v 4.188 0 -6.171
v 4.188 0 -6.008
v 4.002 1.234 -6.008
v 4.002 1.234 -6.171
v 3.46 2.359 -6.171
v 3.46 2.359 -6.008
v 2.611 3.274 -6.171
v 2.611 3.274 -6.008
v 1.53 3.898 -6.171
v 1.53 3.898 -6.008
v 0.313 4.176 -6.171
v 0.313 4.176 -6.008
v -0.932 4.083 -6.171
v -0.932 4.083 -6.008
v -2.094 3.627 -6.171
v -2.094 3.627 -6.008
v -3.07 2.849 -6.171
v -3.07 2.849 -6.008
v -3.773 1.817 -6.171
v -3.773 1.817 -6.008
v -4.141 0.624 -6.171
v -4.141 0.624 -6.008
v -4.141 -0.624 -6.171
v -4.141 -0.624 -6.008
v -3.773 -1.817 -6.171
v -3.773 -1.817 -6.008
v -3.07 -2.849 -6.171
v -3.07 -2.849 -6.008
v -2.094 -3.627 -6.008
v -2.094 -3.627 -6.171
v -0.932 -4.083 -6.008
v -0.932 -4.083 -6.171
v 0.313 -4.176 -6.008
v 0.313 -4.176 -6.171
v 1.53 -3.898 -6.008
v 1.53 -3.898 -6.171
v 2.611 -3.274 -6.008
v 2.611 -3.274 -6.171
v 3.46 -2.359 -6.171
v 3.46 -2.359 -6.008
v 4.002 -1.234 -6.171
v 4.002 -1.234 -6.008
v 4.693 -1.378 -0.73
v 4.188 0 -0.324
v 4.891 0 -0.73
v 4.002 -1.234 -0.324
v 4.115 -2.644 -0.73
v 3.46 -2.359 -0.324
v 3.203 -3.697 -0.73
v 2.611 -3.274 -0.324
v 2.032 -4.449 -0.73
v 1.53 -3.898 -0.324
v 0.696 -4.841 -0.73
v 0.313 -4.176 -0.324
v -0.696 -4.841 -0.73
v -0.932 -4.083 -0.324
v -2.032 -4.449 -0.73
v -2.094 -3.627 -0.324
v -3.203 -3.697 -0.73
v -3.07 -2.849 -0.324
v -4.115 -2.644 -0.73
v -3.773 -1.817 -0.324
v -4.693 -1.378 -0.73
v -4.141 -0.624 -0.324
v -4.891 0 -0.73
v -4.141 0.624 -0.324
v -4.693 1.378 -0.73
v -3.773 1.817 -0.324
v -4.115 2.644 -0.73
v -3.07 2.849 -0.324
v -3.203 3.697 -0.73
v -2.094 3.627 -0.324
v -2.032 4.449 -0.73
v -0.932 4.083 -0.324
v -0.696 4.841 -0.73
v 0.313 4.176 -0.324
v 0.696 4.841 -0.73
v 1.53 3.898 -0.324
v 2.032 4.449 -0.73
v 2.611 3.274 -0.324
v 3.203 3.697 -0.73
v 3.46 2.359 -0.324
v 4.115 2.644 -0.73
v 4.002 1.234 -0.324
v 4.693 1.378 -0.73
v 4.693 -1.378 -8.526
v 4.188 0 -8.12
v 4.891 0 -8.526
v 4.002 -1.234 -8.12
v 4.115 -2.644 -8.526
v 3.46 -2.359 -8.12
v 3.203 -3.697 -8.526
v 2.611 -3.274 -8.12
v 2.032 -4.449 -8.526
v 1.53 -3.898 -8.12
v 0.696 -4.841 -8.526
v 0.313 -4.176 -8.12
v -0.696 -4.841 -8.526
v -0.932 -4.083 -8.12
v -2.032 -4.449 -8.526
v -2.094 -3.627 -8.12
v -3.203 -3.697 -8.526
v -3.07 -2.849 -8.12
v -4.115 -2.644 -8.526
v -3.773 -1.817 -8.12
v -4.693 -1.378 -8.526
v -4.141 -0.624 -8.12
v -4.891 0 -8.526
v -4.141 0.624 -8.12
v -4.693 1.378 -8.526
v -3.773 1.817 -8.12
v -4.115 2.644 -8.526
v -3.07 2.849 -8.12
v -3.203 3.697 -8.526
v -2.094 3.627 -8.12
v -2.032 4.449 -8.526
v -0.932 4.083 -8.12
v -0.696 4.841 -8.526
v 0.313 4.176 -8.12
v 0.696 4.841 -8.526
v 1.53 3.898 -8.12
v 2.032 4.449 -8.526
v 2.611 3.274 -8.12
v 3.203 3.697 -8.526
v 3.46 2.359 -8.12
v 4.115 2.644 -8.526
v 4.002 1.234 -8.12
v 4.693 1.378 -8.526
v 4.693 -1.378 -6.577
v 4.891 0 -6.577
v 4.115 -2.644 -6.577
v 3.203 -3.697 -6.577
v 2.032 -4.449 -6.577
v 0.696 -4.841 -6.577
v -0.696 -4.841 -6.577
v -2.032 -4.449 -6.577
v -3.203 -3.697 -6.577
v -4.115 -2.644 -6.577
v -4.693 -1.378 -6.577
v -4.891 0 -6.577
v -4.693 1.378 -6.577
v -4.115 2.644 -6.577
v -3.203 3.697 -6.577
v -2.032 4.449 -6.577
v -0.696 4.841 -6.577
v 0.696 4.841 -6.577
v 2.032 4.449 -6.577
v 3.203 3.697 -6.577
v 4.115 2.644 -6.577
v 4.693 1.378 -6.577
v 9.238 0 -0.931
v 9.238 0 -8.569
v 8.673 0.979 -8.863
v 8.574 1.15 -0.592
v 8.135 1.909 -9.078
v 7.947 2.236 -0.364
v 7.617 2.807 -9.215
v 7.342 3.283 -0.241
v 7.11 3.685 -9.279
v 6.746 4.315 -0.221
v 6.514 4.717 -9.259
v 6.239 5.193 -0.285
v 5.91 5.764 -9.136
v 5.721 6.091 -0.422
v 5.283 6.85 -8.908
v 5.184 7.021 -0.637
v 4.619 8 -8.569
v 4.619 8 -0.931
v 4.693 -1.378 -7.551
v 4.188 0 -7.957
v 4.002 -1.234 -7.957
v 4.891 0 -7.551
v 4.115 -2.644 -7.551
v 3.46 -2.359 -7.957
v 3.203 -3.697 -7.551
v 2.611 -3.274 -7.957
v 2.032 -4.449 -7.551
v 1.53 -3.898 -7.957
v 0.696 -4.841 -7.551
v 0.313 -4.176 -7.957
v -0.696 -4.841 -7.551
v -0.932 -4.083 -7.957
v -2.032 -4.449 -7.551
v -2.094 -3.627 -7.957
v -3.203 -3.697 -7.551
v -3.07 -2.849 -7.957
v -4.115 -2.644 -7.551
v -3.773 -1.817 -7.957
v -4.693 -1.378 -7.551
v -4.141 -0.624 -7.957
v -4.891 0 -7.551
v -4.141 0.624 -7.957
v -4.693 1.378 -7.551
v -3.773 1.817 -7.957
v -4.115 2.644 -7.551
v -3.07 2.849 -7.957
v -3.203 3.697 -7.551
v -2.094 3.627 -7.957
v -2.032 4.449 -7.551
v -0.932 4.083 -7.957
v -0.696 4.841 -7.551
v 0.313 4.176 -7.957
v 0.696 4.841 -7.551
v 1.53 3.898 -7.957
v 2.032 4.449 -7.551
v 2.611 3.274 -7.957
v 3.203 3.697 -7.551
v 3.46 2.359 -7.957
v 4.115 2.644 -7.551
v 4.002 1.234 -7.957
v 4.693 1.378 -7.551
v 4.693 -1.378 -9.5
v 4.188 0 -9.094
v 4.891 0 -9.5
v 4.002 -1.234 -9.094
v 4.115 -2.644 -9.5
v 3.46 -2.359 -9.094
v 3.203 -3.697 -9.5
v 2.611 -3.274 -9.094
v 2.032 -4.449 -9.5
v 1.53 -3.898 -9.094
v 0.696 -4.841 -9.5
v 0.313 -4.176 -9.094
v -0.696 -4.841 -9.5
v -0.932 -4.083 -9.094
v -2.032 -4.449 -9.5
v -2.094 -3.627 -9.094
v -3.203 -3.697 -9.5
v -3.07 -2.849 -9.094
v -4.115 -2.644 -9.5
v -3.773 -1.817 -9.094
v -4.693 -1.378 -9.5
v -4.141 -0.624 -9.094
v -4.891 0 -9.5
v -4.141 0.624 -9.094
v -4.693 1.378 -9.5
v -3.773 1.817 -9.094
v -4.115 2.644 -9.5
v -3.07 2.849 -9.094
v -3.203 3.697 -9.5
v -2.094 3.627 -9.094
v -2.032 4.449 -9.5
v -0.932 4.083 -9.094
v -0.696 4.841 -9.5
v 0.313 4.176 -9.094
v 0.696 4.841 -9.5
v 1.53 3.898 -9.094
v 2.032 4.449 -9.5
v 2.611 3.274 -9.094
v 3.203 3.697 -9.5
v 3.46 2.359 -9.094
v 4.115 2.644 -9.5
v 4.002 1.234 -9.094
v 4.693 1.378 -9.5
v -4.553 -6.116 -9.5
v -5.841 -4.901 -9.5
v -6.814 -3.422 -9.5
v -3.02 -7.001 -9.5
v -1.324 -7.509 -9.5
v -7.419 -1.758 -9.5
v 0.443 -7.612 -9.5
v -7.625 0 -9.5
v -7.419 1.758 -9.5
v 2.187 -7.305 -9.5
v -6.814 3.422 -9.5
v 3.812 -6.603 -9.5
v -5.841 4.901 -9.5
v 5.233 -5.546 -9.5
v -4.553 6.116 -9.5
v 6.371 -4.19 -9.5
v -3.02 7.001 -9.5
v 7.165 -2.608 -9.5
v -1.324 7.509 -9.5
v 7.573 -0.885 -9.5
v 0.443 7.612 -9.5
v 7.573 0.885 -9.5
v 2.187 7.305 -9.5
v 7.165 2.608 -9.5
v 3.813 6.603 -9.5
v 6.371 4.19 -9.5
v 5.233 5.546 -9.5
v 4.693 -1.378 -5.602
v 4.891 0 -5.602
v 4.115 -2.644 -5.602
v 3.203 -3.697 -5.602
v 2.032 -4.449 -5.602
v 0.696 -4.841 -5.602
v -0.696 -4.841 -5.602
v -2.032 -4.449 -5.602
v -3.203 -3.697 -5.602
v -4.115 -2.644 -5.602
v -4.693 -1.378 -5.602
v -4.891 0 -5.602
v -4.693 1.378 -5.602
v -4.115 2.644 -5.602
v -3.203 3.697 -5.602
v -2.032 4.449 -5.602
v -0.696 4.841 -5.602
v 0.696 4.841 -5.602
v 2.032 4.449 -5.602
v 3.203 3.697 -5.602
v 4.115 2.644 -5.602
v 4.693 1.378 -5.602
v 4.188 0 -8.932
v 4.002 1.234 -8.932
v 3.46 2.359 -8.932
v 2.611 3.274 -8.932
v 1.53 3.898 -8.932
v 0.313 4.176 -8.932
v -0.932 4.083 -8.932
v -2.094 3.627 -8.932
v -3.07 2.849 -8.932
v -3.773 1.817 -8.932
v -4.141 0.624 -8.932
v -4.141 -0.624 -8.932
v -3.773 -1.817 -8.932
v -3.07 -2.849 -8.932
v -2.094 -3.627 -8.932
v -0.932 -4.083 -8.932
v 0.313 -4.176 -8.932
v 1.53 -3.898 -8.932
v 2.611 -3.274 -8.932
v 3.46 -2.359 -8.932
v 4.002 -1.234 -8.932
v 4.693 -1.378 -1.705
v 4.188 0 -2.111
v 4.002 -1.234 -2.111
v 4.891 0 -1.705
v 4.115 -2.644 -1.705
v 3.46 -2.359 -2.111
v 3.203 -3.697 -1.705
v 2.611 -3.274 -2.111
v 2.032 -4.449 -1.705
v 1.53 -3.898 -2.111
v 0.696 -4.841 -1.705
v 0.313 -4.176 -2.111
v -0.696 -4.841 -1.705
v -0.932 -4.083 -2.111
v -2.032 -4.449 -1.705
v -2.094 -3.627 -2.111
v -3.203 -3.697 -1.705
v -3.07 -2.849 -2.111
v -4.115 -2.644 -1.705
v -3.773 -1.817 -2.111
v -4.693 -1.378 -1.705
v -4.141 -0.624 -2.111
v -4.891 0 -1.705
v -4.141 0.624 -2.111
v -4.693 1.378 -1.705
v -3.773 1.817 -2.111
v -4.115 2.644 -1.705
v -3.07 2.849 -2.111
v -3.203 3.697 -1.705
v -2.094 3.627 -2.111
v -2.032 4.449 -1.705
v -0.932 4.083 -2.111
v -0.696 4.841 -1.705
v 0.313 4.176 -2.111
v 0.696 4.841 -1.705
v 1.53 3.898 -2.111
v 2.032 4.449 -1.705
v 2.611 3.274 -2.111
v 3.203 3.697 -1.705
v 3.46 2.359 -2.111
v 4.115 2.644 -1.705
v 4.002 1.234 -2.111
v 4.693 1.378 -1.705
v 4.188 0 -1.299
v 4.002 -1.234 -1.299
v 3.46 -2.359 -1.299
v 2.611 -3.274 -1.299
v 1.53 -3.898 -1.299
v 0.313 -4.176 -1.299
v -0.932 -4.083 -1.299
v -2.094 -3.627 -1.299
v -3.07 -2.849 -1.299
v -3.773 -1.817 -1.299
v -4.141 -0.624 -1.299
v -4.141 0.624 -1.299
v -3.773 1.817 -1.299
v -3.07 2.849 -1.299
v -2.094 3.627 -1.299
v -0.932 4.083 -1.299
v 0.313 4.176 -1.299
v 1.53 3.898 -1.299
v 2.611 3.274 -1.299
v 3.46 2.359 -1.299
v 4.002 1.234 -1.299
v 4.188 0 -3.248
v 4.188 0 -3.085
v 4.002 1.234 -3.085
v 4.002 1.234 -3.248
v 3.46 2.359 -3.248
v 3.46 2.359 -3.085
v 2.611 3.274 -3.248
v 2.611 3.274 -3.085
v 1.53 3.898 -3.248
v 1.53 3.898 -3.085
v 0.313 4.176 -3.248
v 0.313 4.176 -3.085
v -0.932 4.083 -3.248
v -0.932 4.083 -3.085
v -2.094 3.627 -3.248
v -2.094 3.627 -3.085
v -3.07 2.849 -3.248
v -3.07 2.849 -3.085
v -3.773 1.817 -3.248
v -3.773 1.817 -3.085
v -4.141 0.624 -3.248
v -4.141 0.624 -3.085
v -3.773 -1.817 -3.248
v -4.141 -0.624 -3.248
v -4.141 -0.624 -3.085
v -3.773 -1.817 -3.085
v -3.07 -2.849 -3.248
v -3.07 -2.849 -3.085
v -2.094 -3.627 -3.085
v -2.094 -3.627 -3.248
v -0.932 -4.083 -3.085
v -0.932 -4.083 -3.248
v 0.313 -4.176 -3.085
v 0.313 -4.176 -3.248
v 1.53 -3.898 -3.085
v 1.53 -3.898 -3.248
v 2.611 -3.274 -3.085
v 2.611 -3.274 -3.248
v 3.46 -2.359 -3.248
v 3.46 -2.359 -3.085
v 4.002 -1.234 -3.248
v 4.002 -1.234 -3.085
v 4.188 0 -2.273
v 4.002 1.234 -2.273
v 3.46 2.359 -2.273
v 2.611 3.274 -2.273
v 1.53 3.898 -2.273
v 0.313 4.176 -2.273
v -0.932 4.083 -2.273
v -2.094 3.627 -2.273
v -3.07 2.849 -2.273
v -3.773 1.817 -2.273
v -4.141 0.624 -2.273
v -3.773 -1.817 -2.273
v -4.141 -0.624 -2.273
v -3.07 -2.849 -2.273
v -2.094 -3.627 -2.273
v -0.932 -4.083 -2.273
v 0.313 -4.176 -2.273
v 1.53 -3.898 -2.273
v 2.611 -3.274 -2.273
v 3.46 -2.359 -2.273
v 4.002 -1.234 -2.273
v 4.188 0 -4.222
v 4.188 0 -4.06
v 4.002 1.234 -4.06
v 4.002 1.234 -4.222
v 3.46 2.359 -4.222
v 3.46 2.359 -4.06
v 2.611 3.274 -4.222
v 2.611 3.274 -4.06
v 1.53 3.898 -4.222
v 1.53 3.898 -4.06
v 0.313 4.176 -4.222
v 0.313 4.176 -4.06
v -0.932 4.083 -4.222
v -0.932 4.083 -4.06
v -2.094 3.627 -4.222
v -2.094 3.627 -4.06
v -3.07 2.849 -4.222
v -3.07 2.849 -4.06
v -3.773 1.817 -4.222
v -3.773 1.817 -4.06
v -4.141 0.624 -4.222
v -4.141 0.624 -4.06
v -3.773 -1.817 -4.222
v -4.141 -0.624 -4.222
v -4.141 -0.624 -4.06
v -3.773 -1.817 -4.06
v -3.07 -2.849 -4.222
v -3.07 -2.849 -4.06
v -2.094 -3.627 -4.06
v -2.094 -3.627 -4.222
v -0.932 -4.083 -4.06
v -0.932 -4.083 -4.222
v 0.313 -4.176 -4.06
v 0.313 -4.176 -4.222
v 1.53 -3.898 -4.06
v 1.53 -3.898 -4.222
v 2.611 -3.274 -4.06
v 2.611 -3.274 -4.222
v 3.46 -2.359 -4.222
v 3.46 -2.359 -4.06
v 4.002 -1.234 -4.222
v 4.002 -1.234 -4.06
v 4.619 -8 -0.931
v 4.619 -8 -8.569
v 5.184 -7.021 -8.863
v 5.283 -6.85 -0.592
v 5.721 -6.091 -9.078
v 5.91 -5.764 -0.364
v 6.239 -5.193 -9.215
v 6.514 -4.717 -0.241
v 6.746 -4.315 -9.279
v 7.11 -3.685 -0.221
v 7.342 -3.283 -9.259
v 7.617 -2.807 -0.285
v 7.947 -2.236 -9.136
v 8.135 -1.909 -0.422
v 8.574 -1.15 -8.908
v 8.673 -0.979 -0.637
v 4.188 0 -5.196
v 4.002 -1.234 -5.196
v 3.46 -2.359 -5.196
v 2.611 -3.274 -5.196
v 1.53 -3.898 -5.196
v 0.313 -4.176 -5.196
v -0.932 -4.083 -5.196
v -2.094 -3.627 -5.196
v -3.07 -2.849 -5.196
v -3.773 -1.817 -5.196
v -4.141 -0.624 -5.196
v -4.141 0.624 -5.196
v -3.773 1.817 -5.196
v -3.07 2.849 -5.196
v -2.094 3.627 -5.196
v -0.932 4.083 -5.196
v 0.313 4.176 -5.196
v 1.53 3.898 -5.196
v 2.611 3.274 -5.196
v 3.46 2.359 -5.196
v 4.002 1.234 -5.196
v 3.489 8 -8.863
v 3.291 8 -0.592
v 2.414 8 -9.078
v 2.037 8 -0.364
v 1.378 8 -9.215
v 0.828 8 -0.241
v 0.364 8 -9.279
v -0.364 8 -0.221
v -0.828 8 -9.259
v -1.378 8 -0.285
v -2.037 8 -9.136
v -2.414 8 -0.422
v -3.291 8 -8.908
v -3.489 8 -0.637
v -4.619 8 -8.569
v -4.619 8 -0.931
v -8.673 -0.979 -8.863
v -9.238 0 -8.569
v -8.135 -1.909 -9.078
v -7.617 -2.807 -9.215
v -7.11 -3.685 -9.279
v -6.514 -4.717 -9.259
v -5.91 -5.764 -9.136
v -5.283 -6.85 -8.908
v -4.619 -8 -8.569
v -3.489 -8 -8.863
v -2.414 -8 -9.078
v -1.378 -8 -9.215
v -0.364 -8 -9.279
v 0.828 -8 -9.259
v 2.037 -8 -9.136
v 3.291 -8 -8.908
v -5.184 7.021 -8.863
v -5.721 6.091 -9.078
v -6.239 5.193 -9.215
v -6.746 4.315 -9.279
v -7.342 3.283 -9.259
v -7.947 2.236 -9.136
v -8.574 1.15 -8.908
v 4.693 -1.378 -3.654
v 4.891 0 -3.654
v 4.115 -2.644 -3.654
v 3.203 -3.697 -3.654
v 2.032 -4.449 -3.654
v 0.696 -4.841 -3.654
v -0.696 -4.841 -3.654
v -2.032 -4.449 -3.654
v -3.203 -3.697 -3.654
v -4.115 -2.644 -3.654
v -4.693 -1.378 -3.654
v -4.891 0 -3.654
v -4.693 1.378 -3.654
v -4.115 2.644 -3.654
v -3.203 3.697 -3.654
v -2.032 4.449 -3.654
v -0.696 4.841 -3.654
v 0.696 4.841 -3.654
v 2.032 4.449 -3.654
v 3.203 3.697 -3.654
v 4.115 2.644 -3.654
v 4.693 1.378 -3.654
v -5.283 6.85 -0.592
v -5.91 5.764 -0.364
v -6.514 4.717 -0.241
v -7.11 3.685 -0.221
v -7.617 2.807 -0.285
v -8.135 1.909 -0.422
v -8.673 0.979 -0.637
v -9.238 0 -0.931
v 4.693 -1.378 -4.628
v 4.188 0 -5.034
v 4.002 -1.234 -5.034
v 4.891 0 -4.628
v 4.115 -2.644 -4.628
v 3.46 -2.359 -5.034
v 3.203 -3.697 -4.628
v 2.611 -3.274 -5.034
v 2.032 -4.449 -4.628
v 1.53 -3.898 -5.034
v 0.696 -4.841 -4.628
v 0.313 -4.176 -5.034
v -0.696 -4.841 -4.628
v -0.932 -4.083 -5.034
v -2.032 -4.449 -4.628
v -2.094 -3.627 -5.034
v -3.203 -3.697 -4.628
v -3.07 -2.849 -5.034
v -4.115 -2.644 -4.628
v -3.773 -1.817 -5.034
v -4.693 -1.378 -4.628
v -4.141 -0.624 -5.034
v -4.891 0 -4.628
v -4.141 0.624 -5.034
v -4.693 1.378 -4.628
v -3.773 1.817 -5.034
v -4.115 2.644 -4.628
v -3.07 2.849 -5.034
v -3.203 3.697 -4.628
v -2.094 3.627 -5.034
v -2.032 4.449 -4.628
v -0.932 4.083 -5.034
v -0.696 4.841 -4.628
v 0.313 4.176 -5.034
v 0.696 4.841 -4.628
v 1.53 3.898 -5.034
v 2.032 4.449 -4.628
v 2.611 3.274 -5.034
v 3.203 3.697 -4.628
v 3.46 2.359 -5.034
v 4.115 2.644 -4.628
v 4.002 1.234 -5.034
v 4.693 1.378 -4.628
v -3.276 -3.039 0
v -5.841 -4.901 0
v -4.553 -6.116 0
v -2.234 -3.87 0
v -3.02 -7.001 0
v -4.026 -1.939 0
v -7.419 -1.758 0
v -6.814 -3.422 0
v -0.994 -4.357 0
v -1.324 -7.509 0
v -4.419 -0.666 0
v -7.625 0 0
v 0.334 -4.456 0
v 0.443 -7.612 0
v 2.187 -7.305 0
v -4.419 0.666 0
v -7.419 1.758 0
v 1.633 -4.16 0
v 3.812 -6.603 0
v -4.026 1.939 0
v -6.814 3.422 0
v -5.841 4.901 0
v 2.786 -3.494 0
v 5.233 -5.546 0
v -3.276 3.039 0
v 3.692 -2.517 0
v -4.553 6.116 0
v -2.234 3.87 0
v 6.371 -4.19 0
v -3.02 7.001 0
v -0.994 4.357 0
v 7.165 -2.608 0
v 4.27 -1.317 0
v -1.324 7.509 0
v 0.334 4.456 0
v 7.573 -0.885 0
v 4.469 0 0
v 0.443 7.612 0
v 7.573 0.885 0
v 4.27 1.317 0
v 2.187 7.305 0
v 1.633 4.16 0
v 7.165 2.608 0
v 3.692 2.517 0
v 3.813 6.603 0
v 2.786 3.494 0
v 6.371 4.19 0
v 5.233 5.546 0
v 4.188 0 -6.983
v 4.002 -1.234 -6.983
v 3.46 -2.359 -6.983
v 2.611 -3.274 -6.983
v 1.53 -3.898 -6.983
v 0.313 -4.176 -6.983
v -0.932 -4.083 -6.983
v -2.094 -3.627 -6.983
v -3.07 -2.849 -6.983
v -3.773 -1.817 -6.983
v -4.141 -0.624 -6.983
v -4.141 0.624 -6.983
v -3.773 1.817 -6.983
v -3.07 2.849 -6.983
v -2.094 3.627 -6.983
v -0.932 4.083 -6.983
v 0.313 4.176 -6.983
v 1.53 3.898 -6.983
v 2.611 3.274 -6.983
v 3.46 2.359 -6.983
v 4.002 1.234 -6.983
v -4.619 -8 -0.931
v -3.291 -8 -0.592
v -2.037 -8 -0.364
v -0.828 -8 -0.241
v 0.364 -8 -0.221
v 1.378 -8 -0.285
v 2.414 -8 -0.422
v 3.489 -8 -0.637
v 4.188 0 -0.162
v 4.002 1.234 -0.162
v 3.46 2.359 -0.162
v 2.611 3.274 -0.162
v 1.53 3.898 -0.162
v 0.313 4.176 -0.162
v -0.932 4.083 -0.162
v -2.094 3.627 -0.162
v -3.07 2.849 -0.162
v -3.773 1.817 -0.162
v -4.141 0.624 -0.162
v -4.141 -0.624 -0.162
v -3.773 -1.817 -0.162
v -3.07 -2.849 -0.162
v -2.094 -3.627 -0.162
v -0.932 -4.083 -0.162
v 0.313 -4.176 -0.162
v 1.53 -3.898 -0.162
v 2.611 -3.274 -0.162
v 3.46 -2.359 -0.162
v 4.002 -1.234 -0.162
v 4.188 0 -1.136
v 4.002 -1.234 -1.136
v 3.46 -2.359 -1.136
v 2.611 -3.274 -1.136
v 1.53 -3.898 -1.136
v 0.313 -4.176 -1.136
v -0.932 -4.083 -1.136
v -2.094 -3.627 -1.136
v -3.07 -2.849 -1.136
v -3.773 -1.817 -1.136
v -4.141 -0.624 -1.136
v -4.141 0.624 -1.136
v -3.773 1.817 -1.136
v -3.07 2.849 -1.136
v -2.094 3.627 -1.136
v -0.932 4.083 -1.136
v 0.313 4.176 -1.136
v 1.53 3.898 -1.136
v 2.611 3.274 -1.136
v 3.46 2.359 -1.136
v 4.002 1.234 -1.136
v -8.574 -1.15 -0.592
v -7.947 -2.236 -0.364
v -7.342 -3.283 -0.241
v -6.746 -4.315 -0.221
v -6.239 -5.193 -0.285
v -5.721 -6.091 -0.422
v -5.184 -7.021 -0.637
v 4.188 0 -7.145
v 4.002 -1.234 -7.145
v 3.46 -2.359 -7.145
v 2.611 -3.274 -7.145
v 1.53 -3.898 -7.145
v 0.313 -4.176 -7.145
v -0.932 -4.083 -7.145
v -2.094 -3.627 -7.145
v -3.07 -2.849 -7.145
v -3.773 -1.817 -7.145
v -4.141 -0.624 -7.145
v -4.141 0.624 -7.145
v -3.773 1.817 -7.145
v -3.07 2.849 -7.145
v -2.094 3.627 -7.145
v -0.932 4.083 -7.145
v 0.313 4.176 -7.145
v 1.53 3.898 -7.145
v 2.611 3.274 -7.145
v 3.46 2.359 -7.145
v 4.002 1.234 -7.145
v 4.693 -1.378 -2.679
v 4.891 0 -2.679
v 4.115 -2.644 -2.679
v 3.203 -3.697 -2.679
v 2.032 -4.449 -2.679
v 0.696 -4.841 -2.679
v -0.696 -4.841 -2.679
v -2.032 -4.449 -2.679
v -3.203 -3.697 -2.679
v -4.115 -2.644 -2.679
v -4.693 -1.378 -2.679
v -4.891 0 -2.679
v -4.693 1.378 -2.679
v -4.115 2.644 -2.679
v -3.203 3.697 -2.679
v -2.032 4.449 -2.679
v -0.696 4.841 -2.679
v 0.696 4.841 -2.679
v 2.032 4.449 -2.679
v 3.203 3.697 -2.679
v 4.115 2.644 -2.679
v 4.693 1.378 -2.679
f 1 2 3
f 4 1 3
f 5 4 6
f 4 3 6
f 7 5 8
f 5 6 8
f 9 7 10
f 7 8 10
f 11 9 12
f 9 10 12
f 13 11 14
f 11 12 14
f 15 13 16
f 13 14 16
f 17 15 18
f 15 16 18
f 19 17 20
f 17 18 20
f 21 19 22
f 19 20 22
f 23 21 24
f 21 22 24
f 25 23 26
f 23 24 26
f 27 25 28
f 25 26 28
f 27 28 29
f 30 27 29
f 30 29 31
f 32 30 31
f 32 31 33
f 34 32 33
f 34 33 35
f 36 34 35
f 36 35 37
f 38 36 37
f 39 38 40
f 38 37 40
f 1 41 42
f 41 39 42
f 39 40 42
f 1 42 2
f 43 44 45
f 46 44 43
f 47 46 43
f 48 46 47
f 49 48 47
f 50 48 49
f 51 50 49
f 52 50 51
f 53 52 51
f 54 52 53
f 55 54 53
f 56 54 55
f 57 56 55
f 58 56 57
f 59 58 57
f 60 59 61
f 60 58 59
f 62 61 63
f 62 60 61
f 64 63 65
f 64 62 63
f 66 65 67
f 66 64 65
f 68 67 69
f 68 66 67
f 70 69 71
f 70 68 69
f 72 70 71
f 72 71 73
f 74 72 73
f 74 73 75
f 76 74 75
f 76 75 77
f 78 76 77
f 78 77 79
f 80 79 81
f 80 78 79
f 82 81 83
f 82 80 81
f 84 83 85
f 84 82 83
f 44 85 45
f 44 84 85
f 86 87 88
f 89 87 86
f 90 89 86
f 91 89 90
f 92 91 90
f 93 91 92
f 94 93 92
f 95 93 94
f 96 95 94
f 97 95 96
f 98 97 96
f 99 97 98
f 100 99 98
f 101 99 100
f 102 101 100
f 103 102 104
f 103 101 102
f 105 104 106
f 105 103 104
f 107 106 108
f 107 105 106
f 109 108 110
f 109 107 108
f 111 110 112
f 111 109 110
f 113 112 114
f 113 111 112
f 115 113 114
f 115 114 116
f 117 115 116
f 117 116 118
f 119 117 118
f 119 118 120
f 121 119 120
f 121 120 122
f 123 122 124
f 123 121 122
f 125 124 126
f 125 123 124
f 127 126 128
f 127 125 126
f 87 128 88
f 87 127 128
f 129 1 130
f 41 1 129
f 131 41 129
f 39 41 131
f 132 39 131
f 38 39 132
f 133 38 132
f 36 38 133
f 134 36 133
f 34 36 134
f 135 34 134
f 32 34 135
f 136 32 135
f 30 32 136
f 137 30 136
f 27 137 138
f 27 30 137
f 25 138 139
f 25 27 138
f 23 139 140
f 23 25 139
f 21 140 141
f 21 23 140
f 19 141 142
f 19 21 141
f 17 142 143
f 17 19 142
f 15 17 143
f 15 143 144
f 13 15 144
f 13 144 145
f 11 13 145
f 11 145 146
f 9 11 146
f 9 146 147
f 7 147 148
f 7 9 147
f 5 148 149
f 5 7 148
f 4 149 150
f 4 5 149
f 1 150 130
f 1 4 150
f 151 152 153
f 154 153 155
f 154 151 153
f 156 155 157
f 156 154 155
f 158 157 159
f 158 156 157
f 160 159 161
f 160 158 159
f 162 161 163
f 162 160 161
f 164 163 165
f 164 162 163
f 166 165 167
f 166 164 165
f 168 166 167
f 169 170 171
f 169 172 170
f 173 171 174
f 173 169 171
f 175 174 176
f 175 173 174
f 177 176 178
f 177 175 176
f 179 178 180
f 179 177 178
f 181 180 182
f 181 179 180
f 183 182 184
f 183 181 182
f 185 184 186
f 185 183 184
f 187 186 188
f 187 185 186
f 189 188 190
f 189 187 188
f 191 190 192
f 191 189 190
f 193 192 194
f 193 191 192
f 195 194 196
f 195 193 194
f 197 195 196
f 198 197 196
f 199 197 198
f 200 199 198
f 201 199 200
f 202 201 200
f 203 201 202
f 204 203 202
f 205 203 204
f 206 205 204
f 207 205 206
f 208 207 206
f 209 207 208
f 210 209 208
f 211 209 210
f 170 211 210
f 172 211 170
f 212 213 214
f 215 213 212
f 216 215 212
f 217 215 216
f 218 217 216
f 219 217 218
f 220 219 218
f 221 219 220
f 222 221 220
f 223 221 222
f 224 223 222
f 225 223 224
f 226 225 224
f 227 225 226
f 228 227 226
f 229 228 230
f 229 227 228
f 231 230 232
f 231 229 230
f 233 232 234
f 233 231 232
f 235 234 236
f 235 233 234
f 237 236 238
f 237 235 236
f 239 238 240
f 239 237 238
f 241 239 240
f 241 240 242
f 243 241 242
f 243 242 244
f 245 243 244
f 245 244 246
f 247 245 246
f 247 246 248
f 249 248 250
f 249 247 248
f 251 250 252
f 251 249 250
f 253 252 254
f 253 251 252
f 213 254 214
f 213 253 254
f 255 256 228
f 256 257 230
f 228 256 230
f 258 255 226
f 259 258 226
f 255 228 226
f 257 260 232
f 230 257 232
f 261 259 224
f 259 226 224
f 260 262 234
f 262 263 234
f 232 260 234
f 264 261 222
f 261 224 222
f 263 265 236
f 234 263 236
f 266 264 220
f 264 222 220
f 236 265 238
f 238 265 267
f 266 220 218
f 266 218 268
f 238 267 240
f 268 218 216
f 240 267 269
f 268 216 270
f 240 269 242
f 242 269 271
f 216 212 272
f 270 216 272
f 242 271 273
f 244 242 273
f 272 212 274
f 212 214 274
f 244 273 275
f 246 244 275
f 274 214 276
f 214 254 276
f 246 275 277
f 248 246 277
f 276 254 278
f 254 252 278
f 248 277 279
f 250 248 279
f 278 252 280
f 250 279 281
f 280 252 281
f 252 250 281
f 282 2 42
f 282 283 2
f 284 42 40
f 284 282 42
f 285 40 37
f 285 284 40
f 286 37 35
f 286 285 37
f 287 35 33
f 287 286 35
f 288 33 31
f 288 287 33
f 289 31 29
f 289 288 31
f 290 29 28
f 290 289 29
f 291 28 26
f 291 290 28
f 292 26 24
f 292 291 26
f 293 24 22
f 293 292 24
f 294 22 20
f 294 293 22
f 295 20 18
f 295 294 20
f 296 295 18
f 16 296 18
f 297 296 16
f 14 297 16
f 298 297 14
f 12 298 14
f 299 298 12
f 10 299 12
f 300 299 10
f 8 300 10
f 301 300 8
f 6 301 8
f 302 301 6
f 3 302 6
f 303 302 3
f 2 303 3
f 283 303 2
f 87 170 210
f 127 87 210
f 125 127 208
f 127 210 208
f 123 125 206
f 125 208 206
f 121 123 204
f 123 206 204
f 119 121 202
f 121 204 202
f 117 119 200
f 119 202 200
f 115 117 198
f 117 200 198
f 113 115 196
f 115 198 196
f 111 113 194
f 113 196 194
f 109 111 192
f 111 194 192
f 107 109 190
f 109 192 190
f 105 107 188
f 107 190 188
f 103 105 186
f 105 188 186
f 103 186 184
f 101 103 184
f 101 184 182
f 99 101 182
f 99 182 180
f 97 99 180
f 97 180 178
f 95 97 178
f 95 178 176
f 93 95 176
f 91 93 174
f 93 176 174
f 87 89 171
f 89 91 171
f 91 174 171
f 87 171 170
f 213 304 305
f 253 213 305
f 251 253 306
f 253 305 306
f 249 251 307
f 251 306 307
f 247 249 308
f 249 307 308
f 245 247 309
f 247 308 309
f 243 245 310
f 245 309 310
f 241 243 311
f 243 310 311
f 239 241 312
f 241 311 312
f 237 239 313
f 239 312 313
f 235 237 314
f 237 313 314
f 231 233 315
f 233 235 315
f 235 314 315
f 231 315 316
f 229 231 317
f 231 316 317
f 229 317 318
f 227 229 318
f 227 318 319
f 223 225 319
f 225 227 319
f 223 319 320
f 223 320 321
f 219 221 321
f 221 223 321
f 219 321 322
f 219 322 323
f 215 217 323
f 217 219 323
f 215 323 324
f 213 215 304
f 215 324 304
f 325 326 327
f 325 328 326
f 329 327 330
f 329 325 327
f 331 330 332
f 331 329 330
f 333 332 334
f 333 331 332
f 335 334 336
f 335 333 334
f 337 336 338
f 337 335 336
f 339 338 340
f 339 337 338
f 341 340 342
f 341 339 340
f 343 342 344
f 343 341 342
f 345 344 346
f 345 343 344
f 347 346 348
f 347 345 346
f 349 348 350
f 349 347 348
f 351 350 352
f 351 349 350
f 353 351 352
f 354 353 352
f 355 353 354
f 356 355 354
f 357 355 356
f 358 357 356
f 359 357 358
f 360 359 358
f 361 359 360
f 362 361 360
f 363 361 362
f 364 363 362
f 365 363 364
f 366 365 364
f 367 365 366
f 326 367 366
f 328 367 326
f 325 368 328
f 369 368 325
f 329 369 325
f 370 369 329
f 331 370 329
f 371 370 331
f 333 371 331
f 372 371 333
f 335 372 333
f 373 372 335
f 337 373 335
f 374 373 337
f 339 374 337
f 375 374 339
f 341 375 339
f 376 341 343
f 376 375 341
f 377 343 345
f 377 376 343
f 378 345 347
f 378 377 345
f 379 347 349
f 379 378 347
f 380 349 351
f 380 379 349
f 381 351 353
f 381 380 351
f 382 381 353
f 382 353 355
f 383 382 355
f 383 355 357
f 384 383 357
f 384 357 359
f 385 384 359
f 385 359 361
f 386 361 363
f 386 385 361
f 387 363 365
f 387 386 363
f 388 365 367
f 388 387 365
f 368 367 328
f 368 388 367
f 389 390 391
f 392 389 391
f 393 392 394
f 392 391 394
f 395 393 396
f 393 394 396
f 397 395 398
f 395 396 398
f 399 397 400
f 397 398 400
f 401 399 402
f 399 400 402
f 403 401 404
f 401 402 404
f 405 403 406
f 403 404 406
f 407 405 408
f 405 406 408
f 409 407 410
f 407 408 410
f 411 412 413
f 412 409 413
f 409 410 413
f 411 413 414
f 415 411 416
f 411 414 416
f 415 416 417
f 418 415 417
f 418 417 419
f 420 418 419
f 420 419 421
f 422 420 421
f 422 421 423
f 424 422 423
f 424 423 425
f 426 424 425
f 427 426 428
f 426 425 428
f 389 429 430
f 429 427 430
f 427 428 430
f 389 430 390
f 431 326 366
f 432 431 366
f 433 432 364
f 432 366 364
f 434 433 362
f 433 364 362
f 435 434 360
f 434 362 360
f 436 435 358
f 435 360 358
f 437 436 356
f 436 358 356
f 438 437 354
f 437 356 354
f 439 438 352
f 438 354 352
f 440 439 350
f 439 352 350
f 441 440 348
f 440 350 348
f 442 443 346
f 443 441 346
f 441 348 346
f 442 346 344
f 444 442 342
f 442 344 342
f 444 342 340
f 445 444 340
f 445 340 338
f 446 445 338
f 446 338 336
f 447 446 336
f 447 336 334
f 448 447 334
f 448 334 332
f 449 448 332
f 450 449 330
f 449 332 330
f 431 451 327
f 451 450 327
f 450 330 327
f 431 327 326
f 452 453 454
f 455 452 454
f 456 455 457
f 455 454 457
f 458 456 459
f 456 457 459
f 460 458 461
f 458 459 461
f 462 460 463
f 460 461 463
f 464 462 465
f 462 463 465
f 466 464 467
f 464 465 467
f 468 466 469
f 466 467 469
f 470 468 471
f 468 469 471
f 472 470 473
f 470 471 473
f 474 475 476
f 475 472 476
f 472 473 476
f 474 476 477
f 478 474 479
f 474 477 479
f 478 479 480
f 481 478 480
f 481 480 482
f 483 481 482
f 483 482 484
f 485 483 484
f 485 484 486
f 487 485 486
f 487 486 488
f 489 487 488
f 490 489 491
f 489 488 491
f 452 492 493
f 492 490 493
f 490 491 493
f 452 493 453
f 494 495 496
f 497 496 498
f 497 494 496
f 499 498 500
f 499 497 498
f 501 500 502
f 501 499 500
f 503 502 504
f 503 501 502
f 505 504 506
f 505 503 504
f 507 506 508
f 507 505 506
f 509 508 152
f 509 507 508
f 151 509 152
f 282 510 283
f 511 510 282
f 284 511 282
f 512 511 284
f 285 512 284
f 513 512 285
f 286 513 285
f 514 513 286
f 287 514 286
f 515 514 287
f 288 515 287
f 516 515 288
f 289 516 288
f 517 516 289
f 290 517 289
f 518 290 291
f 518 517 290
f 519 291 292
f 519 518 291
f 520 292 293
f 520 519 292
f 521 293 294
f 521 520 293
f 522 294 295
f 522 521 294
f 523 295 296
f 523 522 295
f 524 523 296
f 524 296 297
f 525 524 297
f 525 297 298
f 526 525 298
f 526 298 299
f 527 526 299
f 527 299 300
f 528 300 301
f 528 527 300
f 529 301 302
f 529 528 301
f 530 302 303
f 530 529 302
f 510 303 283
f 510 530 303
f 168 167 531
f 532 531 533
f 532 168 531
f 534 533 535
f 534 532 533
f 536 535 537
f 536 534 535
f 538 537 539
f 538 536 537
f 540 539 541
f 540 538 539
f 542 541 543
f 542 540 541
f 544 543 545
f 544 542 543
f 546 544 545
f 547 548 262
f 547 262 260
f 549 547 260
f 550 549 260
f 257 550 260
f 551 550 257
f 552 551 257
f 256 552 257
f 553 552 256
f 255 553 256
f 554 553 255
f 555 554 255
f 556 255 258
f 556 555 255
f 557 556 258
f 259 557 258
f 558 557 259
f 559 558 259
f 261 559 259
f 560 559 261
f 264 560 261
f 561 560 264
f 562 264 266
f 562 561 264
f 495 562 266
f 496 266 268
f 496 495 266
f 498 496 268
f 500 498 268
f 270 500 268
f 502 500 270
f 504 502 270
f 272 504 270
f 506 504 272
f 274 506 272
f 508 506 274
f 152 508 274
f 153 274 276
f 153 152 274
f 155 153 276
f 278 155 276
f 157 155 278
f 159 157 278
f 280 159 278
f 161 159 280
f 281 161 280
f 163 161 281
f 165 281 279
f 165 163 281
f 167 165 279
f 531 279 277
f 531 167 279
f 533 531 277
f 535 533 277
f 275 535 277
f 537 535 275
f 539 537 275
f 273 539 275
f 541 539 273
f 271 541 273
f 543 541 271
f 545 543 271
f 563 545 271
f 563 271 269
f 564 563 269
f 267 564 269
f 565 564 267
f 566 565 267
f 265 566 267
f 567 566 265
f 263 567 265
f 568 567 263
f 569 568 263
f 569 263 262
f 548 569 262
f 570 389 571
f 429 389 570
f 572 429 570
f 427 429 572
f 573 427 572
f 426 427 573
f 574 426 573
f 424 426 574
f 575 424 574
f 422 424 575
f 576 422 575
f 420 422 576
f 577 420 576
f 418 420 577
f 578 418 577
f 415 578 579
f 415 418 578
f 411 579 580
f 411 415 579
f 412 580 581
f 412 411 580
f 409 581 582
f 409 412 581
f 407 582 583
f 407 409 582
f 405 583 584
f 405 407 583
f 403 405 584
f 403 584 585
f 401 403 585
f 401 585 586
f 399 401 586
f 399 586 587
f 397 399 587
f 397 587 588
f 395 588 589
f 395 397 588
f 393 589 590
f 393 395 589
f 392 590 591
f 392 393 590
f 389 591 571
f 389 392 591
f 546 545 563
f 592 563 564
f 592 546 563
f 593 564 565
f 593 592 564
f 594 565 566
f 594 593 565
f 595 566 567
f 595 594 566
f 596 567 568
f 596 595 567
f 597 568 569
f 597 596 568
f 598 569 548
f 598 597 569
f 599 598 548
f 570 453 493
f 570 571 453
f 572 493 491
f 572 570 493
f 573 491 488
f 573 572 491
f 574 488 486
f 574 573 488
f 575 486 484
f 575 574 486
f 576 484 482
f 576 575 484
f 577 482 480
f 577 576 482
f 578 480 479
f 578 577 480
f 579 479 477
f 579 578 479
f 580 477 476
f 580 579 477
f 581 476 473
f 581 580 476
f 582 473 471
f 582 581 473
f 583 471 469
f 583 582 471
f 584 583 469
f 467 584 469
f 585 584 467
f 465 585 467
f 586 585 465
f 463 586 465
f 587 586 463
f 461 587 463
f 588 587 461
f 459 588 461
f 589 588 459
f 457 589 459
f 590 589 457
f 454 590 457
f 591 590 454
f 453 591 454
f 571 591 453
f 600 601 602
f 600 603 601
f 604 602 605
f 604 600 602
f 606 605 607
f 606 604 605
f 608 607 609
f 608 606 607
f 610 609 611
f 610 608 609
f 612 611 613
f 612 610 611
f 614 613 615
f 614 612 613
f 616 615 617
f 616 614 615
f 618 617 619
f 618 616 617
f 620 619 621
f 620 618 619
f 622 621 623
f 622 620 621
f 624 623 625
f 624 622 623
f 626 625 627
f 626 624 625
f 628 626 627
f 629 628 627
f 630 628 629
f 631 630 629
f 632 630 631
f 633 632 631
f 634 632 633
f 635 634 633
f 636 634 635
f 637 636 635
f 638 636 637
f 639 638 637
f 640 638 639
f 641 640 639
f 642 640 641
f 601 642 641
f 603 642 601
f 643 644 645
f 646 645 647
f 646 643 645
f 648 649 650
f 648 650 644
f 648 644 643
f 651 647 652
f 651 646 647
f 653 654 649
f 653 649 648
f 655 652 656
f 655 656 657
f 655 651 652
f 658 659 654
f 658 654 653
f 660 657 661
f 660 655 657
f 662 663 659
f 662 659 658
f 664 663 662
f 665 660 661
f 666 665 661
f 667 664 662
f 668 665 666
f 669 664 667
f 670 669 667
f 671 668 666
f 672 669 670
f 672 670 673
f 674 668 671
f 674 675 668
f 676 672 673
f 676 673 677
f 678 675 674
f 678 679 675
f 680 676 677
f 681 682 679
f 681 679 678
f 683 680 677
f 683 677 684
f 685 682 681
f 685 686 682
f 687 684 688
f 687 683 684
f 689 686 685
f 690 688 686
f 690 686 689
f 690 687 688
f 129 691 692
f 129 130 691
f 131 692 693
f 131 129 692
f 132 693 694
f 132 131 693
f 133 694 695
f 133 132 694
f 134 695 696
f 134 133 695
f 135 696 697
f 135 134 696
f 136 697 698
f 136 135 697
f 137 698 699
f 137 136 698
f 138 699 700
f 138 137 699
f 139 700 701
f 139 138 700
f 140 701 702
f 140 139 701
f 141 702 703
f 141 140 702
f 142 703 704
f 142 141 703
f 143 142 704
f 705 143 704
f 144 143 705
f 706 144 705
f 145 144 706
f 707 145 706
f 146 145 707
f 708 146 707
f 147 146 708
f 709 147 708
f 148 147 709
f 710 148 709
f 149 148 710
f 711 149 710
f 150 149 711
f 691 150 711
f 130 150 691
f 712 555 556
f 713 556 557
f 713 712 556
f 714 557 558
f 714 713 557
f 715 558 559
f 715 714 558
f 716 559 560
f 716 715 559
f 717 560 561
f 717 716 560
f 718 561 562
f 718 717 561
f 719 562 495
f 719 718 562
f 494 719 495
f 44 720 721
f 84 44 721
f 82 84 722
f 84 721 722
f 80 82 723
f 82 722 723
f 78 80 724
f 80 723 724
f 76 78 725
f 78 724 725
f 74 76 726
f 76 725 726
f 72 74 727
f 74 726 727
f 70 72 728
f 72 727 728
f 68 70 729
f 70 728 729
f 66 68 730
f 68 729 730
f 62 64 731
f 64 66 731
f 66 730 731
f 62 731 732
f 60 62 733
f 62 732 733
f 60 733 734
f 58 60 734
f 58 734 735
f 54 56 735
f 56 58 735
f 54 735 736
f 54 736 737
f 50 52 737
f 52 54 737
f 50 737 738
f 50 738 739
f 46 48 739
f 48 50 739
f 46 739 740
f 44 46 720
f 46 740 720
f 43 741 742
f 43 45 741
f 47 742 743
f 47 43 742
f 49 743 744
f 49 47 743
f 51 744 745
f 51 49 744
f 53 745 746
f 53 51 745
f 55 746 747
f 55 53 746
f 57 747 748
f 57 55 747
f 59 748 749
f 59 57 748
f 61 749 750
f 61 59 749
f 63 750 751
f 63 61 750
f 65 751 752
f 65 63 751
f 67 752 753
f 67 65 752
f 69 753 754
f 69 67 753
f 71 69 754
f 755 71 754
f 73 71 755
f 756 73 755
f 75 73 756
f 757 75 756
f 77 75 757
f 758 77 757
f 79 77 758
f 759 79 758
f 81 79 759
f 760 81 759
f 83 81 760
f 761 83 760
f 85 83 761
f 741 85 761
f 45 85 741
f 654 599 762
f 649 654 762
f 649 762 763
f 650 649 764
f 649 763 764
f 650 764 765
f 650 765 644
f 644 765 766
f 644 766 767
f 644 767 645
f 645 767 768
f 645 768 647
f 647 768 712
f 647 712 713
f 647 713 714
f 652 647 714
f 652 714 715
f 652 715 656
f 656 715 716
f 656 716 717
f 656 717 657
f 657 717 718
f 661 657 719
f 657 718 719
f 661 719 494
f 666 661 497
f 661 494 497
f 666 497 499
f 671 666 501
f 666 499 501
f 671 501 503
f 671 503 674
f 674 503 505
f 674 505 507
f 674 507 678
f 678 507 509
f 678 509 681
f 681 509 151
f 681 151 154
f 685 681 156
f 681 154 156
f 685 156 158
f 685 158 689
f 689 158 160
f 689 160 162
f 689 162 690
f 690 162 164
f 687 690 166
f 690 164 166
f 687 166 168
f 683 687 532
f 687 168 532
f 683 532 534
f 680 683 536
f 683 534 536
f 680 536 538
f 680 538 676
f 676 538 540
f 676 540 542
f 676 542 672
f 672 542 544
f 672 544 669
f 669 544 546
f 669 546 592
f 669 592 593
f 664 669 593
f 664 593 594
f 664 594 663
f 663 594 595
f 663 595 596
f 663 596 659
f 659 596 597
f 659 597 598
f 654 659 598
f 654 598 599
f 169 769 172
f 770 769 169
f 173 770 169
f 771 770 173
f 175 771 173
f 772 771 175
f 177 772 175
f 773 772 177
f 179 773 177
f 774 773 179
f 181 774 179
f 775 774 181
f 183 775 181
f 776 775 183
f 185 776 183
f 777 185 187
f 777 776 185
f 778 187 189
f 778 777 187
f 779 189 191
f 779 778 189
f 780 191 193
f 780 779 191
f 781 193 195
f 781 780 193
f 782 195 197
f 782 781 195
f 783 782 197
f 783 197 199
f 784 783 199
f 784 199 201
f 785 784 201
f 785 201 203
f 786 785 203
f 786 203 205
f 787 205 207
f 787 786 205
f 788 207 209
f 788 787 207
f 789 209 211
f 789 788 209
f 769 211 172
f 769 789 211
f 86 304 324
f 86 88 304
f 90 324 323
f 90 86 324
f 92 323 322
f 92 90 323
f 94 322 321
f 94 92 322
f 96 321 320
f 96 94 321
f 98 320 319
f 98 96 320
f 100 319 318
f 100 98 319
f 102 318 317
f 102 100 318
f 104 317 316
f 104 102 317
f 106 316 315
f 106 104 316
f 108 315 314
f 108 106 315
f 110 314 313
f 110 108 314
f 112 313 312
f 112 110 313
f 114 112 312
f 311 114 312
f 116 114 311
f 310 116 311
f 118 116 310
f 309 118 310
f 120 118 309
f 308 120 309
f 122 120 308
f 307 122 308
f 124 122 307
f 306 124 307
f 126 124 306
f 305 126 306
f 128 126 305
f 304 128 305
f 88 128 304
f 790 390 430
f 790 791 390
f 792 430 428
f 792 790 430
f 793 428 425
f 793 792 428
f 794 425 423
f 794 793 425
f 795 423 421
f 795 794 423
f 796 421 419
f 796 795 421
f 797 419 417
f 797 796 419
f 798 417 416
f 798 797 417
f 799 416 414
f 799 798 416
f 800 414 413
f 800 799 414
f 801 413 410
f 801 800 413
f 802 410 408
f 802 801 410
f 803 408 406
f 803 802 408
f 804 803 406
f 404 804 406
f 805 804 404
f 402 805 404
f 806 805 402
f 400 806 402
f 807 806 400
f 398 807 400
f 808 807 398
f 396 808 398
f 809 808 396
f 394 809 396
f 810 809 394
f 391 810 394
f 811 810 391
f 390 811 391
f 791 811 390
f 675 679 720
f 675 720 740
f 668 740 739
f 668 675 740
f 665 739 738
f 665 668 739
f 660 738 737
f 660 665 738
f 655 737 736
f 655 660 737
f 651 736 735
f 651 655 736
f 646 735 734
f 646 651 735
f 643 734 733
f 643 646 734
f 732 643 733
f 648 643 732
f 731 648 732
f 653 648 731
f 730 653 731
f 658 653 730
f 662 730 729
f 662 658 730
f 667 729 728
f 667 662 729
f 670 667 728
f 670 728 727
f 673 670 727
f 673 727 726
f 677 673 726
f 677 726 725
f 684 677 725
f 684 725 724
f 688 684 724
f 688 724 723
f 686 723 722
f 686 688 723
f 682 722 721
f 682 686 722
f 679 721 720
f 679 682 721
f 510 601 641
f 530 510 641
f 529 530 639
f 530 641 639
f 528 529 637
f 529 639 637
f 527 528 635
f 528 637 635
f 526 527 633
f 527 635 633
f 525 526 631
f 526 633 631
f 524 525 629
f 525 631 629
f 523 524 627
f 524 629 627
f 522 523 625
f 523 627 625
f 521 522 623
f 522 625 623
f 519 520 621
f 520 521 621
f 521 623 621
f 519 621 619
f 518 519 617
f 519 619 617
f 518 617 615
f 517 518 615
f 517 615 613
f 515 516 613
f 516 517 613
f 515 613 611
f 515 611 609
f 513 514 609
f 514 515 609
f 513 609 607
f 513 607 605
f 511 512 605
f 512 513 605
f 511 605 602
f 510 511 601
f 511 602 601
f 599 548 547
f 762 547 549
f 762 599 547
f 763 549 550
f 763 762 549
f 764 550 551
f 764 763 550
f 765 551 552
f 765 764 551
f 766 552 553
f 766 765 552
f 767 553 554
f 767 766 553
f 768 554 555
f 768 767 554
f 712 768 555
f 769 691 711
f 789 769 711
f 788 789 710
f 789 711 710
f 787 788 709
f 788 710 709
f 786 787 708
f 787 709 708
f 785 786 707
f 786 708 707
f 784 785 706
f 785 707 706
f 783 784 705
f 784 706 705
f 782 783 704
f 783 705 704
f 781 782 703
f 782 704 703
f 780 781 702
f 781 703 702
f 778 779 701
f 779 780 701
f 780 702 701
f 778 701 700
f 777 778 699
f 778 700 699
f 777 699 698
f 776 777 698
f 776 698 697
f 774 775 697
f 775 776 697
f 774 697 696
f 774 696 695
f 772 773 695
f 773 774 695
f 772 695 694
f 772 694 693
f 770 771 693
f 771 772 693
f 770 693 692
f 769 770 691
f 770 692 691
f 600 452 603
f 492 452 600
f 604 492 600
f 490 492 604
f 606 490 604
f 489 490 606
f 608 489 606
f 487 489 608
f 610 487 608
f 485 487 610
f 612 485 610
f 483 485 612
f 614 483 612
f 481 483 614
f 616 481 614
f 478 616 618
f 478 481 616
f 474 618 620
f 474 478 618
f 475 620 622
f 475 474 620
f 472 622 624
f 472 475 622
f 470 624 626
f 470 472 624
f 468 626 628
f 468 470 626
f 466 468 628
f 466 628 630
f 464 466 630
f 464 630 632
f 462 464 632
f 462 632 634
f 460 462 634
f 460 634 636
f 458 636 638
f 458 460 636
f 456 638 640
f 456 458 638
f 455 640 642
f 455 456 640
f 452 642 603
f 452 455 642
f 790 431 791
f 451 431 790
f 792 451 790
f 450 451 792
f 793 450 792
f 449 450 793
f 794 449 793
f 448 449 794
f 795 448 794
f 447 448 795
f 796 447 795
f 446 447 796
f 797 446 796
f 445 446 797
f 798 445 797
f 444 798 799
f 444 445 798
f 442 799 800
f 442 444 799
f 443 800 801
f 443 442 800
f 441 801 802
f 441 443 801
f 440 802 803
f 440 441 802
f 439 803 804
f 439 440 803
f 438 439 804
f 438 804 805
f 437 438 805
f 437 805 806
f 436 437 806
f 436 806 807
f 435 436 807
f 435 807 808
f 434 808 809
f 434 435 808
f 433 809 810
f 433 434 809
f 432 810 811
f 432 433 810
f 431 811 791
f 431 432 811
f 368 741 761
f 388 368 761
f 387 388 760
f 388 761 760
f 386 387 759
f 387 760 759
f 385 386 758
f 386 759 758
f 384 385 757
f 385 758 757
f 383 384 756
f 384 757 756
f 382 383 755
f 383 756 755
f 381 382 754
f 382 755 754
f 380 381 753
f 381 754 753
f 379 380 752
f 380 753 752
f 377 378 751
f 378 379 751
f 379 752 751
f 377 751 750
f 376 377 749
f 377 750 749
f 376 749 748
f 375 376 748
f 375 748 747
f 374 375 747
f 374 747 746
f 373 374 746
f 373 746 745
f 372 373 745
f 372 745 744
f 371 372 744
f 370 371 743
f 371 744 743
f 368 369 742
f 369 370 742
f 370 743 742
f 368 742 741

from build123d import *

# Parameters (mm, degrees)
SKETCH1_R        = 4.188
BASENUT_DEPTH    = 9.5
LPATTERN10_COUNT = 11
LPATTERN10_PITCH = 0.9744


with BuildPart() as part:
    # Sketch1 → BaseNut (new body)
    with BuildSketch(Plane.XY):
        Polygon((4.618802154, -8), (9.237604307, 0), (4.618802154, 8), (-4.618802154, 8), (-9.237604307, 0), (-4.618802154, -8), align=None)
        Circle(SKETCH1_R, mode=Mode.SUBTRACT)
    extrude(amount=-BASENUT_DEPTH)

    # Sketch2 → Double-Chamfer (revolve, cut)
    with BuildSketch(Plane(origin=(0, 0, 0), x_dir=(1, 0, 0), z_dir=(0, 1, 0))):
        Polygon((-9.237604307, 9.5), (-7.625, 9.5), (-9.237604307, 8.568962469), align=None)
        Polygon((-9.237604307, 0.931037531), (-9.237604307, 0), (-7.625, 0), align=None)
    revolve(axis=Axis((0, 0, -3.375940562), (0, 0, 1)), mode=Mode.SUBTRACT)

    # Sketch4 → Cut-Revolve10 (revolve, cut)
    with BuildSketch(Plane(origin=(0, 0, 0), x_dir=(1, 0, 0), z_dir=(0, 1, 0))):
        Polygon((4.891212628, 9.5), (4.188, 9.094), (3.376, 9.094), (3.376, 9.906), (4.188, 9.906), align=None)
    cut_revolve10 = revolve(axis=Axis((0, 0, 0), (0, 0, -1)), mode=Mode.SUBTRACT)

    # LPattern10: Cut-Revolve10 ×11
    with Locations(*[(0, 0, i * LPATTERN10_PITCH) for i in range(1, LPATTERN10_COUNT)]):
        add(cut_revolve10, mode=Mode.SUBTRACT)


solid = part.part
